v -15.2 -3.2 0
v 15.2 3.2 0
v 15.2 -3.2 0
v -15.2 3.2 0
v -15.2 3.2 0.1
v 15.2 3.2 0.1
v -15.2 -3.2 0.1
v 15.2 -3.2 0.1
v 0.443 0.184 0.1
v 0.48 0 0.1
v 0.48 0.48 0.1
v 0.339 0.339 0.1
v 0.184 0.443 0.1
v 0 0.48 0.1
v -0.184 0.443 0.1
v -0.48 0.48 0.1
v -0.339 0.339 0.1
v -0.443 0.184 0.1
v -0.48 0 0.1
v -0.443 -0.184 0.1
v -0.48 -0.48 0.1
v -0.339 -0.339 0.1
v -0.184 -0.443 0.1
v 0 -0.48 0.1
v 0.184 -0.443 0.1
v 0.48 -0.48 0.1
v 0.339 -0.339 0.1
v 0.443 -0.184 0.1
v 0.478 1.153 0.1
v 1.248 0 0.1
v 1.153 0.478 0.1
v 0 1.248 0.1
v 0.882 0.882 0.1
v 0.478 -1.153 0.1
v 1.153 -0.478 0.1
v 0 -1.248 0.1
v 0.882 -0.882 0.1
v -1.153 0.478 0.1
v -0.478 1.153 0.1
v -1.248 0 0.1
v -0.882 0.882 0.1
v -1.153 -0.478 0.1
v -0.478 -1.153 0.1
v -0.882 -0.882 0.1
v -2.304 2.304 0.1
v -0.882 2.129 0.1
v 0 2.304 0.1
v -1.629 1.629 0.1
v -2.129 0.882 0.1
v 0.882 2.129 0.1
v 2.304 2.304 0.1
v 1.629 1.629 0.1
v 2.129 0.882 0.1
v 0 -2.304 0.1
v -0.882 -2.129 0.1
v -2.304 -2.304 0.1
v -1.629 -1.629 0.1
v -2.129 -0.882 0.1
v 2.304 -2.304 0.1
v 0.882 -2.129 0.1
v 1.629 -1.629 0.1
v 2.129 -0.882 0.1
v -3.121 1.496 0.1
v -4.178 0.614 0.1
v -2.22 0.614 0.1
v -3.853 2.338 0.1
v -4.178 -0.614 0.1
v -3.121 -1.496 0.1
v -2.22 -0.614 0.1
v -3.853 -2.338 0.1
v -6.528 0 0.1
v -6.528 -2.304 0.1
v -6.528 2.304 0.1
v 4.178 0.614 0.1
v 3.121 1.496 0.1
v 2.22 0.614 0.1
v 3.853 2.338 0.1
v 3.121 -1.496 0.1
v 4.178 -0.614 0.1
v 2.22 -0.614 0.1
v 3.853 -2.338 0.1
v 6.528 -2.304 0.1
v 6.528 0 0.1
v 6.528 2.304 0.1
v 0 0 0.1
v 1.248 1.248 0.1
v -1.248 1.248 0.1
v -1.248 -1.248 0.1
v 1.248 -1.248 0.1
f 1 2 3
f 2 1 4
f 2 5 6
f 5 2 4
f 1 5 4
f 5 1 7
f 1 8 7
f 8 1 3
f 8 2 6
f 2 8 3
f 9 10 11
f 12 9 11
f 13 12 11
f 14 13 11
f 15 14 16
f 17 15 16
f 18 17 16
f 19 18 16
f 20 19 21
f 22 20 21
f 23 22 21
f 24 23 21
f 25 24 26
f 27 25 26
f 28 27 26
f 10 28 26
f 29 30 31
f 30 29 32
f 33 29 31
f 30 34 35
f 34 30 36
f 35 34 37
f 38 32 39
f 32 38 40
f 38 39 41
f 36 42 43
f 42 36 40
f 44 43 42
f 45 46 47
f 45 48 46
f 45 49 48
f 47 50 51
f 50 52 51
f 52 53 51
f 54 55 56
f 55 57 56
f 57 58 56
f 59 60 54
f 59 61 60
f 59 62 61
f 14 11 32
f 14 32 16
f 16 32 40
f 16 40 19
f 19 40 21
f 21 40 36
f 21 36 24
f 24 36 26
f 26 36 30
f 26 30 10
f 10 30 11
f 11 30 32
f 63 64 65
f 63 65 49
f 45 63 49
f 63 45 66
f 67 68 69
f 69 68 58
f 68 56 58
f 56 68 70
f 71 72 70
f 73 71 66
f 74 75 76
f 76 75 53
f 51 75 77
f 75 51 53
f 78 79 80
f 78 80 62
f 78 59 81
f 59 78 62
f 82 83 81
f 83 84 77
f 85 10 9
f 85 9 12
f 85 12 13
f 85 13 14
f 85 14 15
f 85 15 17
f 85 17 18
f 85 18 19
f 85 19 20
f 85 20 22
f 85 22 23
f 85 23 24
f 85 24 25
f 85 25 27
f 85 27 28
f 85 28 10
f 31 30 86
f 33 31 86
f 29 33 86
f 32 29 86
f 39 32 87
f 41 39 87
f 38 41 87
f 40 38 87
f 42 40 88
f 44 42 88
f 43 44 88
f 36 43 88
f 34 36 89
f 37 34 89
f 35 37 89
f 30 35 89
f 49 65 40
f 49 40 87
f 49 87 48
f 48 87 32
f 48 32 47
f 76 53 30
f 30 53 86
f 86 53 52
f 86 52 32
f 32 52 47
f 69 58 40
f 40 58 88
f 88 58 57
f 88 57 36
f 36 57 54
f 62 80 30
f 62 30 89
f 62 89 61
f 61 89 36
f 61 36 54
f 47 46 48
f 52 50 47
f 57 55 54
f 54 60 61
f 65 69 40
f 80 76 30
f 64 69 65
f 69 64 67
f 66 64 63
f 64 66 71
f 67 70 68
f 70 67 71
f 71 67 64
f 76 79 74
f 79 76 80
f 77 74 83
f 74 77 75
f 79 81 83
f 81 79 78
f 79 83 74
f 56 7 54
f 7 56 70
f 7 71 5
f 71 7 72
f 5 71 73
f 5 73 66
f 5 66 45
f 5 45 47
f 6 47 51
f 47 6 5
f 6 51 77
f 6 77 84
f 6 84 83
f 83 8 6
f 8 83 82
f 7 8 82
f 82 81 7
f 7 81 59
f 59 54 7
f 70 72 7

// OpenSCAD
// file: ../p/4-4disc.scad
use <../lib.scad>
function ldraw_lib__4_4disc() = [
// 0 Disc 1.0
// 0 Name: 4-4disc.dat
// 0 Author: James Jessiman
// 0 !LDRAW_ORG Primitive UPDATE 2002-02
// 0 !LICENSE Licensed under CC BY 4.0 : see CAreadme.txt
// 
// 0 BFC CERTIFY CCW
  [0,"BFC","CERTIFY"],
  [0,"BFC","CCW"],
// 
// 0 !HISTORY 1998-12-15 [PTadmin] Official Update 1998-10
// 0 !HISTORY 2002-03-23 [sbliss] Added BFC statement
// 0 !HISTORY 2002-04-25 [PTadmin] Official Update 2002-02
// 0 !HISTORY 2007-06-24 [PTadmin] Header formatted for Contributor Agreement
// 0 !HISTORY 2008-07-01 [PTadmin] Official Update 2008-01
// 
// 
// 3 16 0 0 0 1 0 0 0.9239 0 0.3827
  [3,16,0,0,0,1,0,0,0.9239,0,0.3827],
// 3 16 0 0 0 0.9239 0 0.3827 0.7071 0 0.7071
  [3,16,0,0,0,0.9239,0,0.3827,0.7071,0,0.7071],
// 3 16 0 0 0 0.7071 0 0.7071 0.3827 0 0.9239
  [3,16,0,0,0,0.7071,0,0.7071,0.3827,0,0.9239],
// 3 16 0 0 0 0.3827 0 0.9239 0 0 1
  [3,16,0,0,0,0.3827,0,0.9239,0,0,1],
// 3 16 0 0 0 0 0 1 -0.3827 0 0.9239
  [3,16,0,0,0,0,0,1,-0.3827,0,0.9239],
// 3 16 0 0 0 -0.3827 0 0.9239 -0.7071 0 0.7071
  [3,16,0,0,0,-0.3827,0,0.9239,-0.7071,0,0.7071],
// 3 16 0 0 0 -0.7071 0 0.7071 -0.9239 0 0.3827
  [3,16,0,0,0,-0.7071,0,0.7071,-0.9239,0,0.3827],
// 3 16 0 0 0 -0.9239 0 0.3827 -1 0 -0
  [3,16,0,0,0,-0.9239,0,0.3827,-1,0,-0],
// 3 16 0 0 0 -1 0 -0 -0.9239 0 -0.3827
  [3,16,0,0,0,-1,0,-0,-0.9239,0,-0.3827],
// 3 16 0 0 0 -0.9239 0 -0.3827 -0.7071 0 -0.7071
  [3,16,0,0,0,-0.9239,0,-0.3827,-0.7071,0,-0.7071],
// 3 16 0 0 0 -0.7071 0 -0.7071 -0.3827 0 -0.9239
  [3,16,0,0,0,-0.7071,0,-0.7071,-0.3827,0,-0.9239],
// 3 16 0 0 0 -0.3827 0 -0.9239 0 0 -1
  [3,16,0,0,0,-0.3827,0,-0.9239,0,0,-1],
// 3 16 0 0 0 0 0 -1 0.3827 0 -0.9239
  [3,16,0,0,0,0,0,-1,0.3827,0,-0.9239],
// 3 16 0 0 0 0.3827 0 -0.9239 0.7071 0 -0.7071
  [3,16,0,0,0,0.3827,0,-0.9239,0.7071,0,-0.7071],
// 3 16 0 0 0 0.7071 0 -0.7071 0.9239 0 -0.3827
  [3,16,0,0,0,0.7071,0,-0.7071,0.9239,0,-0.3827],
// 3 16 0 0 0 0.9239 0 -0.3827 1 0 0
  [3,16,0,0,0,0.9239,0,-0.3827,1,0,0],
// 0
];
module ldraw_lib__4_4disc(step=0, col=false, unit=2/5, alt=false, line=0.2, solid=!$preview)
    makepoly(ldraw_lib__4_4disc(), step=step, col=col, unit=unit, alt=alt, line=line, solid=solid);
ldraw_lib__4_4disc(line=0.2);
// file: ../p/1-8chrd.scad
use <../lib.scad>
function ldraw_lib__1_8chrd() = [
// 0 Chord 0.125
// 0 Name: 1-8chrd.dat
// 0 Author: Orion Pobursky [OrionP]
// 0 !LDRAW_ORG Primitive UPDATE 2023-05
// 0 !LICENSE Licensed under CC BY 4.0 : see CAreadme.txt
// 
// 0 BFC CERTIFY CCW
  [0,"BFC","CERTIFY"],
  [0,"BFC","CCW"],
// 
// 0 !HISTORY 2004-04-22 [PTadmin] Official Update 2004-02
// 0 !HISTORY 2007-06-22 [PTadmin] Header formatted for Contributor Agreement
// 0 !HISTORY 2008-07-01 [PTadmin] Official Update 2008-01
// 0 !HISTORY 2023-10-27 [OrionP] Rebuilt with PrimGen2, original author westrate
// 0 !HISTORY 2023-10-31 [OrionP] Official Update 2023-05
// 
// 3 16 1 0 0 0.9239 0 0.3827 0.7071 0 0.7071
  [3,16,1,0,0,0.9239,0,0.3827,0.7071,0,0.7071],
];
module ldraw_lib__1_8chrd(step=0, col=false, unit=2/5, alt=false, line=0.2, solid=!$preview)
    makepoly(ldraw_lib__1_8chrd(), step=step, col=col, unit=unit, alt=alt, line=line, solid=solid);
ldraw_lib__1_8chrd(line=0.2);
// file: ../p/4-4ndis.scad
use <../lib.scad>
function ldraw_lib__4_4ndis() = [
// 0 Disc Negative 1.0
// 0 Name: 4-4ndis.dat
// 0 Author: James Jessiman
// 0 !LDRAW_ORG Primitive UPDATE 2012-01
// 0 !LICENSE Licensed under CC BY 4.0 : see CAreadme.txt
// 
// 0 BFC CERTIFY CCW
  [0,"BFC","CERTIFY"],
  [0,"BFC","CCW"],
// 
// 0 !HISTORY 2002-03-23 [sbliss] Added BFC statement; compacted code
// 0 !HISTORY 2002-04-25 [PTadmin] Official Update 2002-02
// 0 !HISTORY 2007-06-24 [PTadmin] Header formatted for Contributor Agreement
// 0 !HISTORY 2008-07-01 [PTadmin] Official Update 2008-01
// 0 !HISTORY 2012-02-16 [Philo] Changed to CCW
// 0 !HISTORY 2012-03-30 [PTadmin] Official Update 2012-01
// 
// 
// 3 16 0.9239 0 0.3827 1 0 0 1 0 1
  [3,16,0.9239,0,0.3827,1,0,0,1,0,1],
// 3 16 0.7071 0 0.7071 0.9239 0 0.3827 1 0 1
  [3,16,0.7071,0,0.7071,0.9239,0,0.3827,1,0,1],
// 3 16 0.3827 0 0.9239 0.7071 0 0.7071 1 0 1
  [3,16,0.3827,0,0.9239,0.7071,0,0.7071,1,0,1],
// 3 16 0 0 1 0.3827 0 0.9239 1 0 1
  [3,16,0,0,1,0.3827,0,0.9239,1,0,1],
// 3 16 -0.3827 0 0.9239 0 0 1 -1 0 1
  [3,16,-0.3827,0,0.9239,0,0,1,-1,0,1],
// 3 16 -0.7071 0 0.7071 -0.3827 0 0.9239 -1 0 1
  [3,16,-0.7071,0,0.7071,-0.3827,0,0.9239,-1,0,1],
// 3 16 -0.9239 0 0.3827 -0.7071 0 0.7071 -1 0 1
  [3,16,-0.9239,0,0.3827,-0.7071,0,0.7071,-1,0,1],
// 3 16 -1 0 0 -0.9239 0 0.3827 -1 0 1
  [3,16,-1,0,0,-0.9239,0,0.3827,-1,0,1],
// 3 16 -0.9239 0 -0.3827 -1 0 0 -1 0 -1
  [3,16,-0.9239,0,-0.3827,-1,0,0,-1,0,-1],
// 3 16 -0.7071 0 -0.7071 -0.9239 0 -0.3827 -1 0 -1
  [3,16,-0.7071,0,-0.7071,-0.9239,0,-0.3827,-1,0,-1],
// 3 16 -0.3827 0 -0.9239 -0.7071 0 -0.7071 -1 0 -1
  [3,16,-0.3827,0,-0.9239,-0.7071,0,-0.7071,-1,0,-1],
// 3 16 0 0 -1 -0.3827 0 -0.9239 -1 0 -1
  [3,16,0,0,-1,-0.3827,0,-0.9239,-1,0,-1],
// 3 16 0.3827 0 -0.9239 0 0 -1 1 0 -1
  [3,16,0.3827,0,-0.9239,0,0,-1,1,0,-1],
// 3 16 0.7071 0 -0.7071 0.3827 0 -0.9239 1 0 -1
  [3,16,0.7071,0,-0.7071,0.3827,0,-0.9239,1,0,-1],
// 3 16 0.9239 0 -0.3827 0.7071 0 -0.7071 1 0 -1
  [3,16,0.9239,0,-0.3827,0.7071,0,-0.7071,1,0,-1],
// 3 16 1 0 0 0.9239 0 -0.3827 1 0 -1
  [3,16,1,0,0,0.9239,0,-0.3827,1,0,-1],
];
module ldraw_lib__4_4ndis(step=0, col=false, unit=2/5, alt=false, line=0.2, solid=!$preview)
    makepoly(ldraw_lib__4_4ndis(), step=step, col=col, unit=unit, alt=alt, line=line, solid=solid);
ldraw_lib__4_4ndis(line=0.2);
// file: ../p/3-16ndis.scad
use <../lib.scad>
function ldraw_lib__3_16ndis() = [
// 0 Disc Negative 0.1875
// 0 Name: 3-16ndis.dat
// 0 Author: Guy Vivan [guyvivan]
// 0 !LDRAW_ORG Primitive UPDATE 2009-01
// 0 !LICENSE Licensed under CC BY 2.0 and CC BY 4.0 : see CAreadme.txt
// 
// 0 BFC CERTIFY CCW
  [0,"BFC","CERTIFY"],
  [0,"BFC","CCW"],
// 
// 0 !HISTORY 2009-05-02 [PTadmin] Official Update 2009-01
// 
// 
// 3 16 1 0 1 0.9239 0 0.3827 1 0 0
  [3,16,1,0,1,0.9239,0,0.3827,1,0,0],
// 3 16 1 0 1 0.7071 0 0.7071 0.9239 0 0.3827
  [3,16,1,0,1,0.7071,0,0.7071,0.9239,0,0.3827],
// 3 16 1 0 1 0.3827 0 0.9239 0.7071 0 0.7071
  [3,16,1,0,1,0.3827,0,0.9239,0.7071,0,0.7071],
// 
// 0 end of file
// 
];
module ldraw_lib__3_16ndis(step=0, col=false, unit=2/5, alt=false, line=0.2, solid=!$preview)
    makepoly(ldraw_lib__3_16ndis(), step=step, col=col, unit=unit, alt=alt, line=line, solid=solid);
ldraw_lib__3_16ndis(line=0.2);
// file: ../p/1-4chrd.scad
use <../lib.scad>
function ldraw_lib__1_4chrd() = [
// 0 Chord 0.25
// 0 Name: 1-4chrd.dat
// 0 Author: Max Martin Richter [MMR1988]
// 0 !LDRAW_ORG Primitive UPDATE 2023-05
// 0 !LICENSE Licensed under CC BY 4.0 : see CAreadme.txt
// 
// 0 BFC CERTIFY CCW
  [0,"BFC","CERTIFY"],
  [0,"BFC","CCW"],
// 
// 0 !HISTORY 2004-04-22 [PTadmin] Official Update 2004-02
// 0 !HISTORY 2007-10-09 [PTadmin] Header formatted for Contributor Agreement
// 0 !HISTORY 2008-07-01 [PTadmin] Official Update 2008-01
// 0 !HISTORY 2012-08-02 [MMR1988] Re-creation with PrimGen2 and Rectifier
// 0 !HISTORY 2012-08-09 [PTadmin] Official Update 2012-02
// 0 !HISTORY 2023-10-27 [OrionP] Change author to MMR1988 from hafhead
// 0 !HISTORY 2023-10-31 [OrionP] Official Update 2023-05
// 
// 4 16 0.9239 0 0.3827 0.3827 0 0.9239 0 0 1 1 0 0
  [4,16,0.9239,0,0.3827,0.3827,0,0.9239,0,0,1,1,0,0],
// 3 16 0.7071 0 0.7071 0.3827 0 0.9239 0.9239 0 0.3827
  [3,16,0.7071,0,0.7071,0.3827,0,0.9239,0.9239,0,0.3827],
];
module ldraw_lib__1_4chrd(step=0, col=false, unit=2/5, alt=false, line=0.2, solid=!$preview)
    makepoly(ldraw_lib__1_4chrd(), step=step, col=col, unit=unit, alt=alt, line=line, solid=solid);
ldraw_lib__1_4chrd(line=0.2);
// file: ../p/logo-train-2006-bold.scad
use <../lib.scad>
use <1-8chrd.scad>
use <4-4disc.scad>
use <4-4ndis.scad>
function ldraw_lib__logo_train_2006_bold() = [
// 0 Logo Train 2006 Bold
// 0 Name: logo-train-2006-bold.dat
// 0 Author: Gerald Lasser [GeraldLasser]
// 0 !LDRAW_ORG Primitive UPDATE 2023-07
// 0 !LICENSE Licensed under CC BY 4.0 : see CAreadme.txt
// 
// 0 BFC CERTIFY CCW
  [0,"BFC","CERTIFY"],
  [0,"BFC","CCW"],
// 
// 0 !HISTORY 2023-12-31 [OrionP] Official Update 2023-07
// 
// 
// 1 16 0 -.25 0 2.5 0 0 0 1 0 0 0 2.5 4-4disc.dat
  [1,16,0,-.25,0,2.5,0,0,0,1,0,0,0,2.5, ldraw_lib__4_4disc()],
// 1 16 0 -.25 0 6.5 0 0 0 1 0 0 0 6.5 4-4ndis.dat
  [1,16,0,-.25,0,6.5,0,0,0,1,0,0,0,6.5, ldraw_lib__4_4ndis()],
// 
// 3 16 -11.0868 -.25 4.5924 -11.5625 -.25 3.2 -6.5 -.25 0
  [3,16,-11.0868,-.25,4.5924,-11.5625,-.25,3.2,-6.5,-.25,0],
// 3 16 -11.0868 -.25 4.5924 -6.5 -.25 0 -6.5 -.25 6.5
  [3,16,-11.0868,-.25,4.5924,-6.5,-.25,0,-6.5,-.25,6.5],
// 3 16 -11.0868 -.25 4.5924 -6.5 -.25 6.5 -8.4852 -.25 8.4852
  [3,16,-11.0868,-.25,4.5924,-6.5,-.25,6.5,-8.4852,-.25,8.4852],
// 3 16 -8.4852 -.25 8.4852 -6.5 -.25 6.5 0 -.25 6.5
  [3,16,-8.4852,-.25,8.4852,-6.5,-.25,6.5,0,-.25,6.5],
// 3 16 -8.4852 -.25 8.4852 0 -.25 6.5 0 -.25 12
  [3,16,-8.4852,-.25,8.4852,0,-.25,6.5,0,-.25,12],
// 3 16 11.5625 -.25 3.2 11.0868 -.25 4.5924 6.5 -.25 0
  [3,16,11.5625,-.25,3.2,11.0868,-.25,4.5924,6.5,-.25,0],
// 3 16 6.5 -.25 0 11.0868 -.25 4.5924 6.5 -.25 6.5
  [3,16,6.5,-.25,0,11.0868,-.25,4.5924,6.5,-.25,6.5],
// 3 16 6.5 -.25 6.5 11.0868 -.25 4.5924 8.4852 -.25 8.4852
  [3,16,6.5,-.25,6.5,11.0868,-.25,4.5924,8.4852,-.25,8.4852],
// 3 16 6.5 -.25 6.5 8.4852 -.25 8.4852 0 -.25 6.5
  [3,16,6.5,-.25,6.5,8.4852,-.25,8.4852,0,-.25,6.5],
// 3 16 0 -.25 6.5 8.4852 -.25 8.4852 0 -.25 12
  [3,16,0,-.25,6.5,8.4852,-.25,8.4852,0,-.25,12],
// 3 16 -11.5625 -.25 -3.2 -11.0868 -.25 -4.5924 -6.5 -.25 0
  [3,16,-11.5625,-.25,-3.2,-11.0868,-.25,-4.5924,-6.5,-.25,0],
// 3 16 -6.5 -.25 0 -11.0868 -.25 -4.5924 -6.5 -.25 -6.5
  [3,16,-6.5,-.25,0,-11.0868,-.25,-4.5924,-6.5,-.25,-6.5],
// 3 16 -6.5 -.25 -6.5 -11.0868 -.25 -4.5924 -8.4852 -.25 -8.4852
  [3,16,-6.5,-.25,-6.5,-11.0868,-.25,-4.5924,-8.4852,-.25,-8.4852],
// 3 16 -6.5 -.25 -6.5 -8.4852 -.25 -8.4852 0 -.25 -6.5
  [3,16,-6.5,-.25,-6.5,-8.4852,-.25,-8.4852,0,-.25,-6.5],
// 3 16 0 -.25 -6.5 -8.4852 -.25 -8.4852 0 -.25 -12
  [3,16,0,-.25,-6.5,-8.4852,-.25,-8.4852,0,-.25,-12],
// 3 16 11.0868 -.25 -4.5924 11.5625 -.25 -3.2 6.5 -.25 0
  [3,16,11.0868,-.25,-4.5924,11.5625,-.25,-3.2,6.5,-.25,0],
// 3 16 11.0868 -.25 -4.5924 6.5 -.25 0 6.5 -.25 -6.5
  [3,16,11.0868,-.25,-4.5924,6.5,-.25,0,6.5,-.25,-6.5],
// 3 16 11.0868 -.25 -4.5924 6.5 -.25 -6.5 8.4852 -.25 -8.4852
  [3,16,11.0868,-.25,-4.5924,6.5,-.25,-6.5,8.4852,-.25,-8.4852],
// 3 16 8.4852 -.25 -8.4852 6.5 -.25 -6.5 0 -.25 -6.5
  [3,16,8.4852,-.25,-8.4852,6.5,-.25,-6.5,0,-.25,-6.5],
// 3 16 8.4852 -.25 -8.4852 0 -.25 -6.5 0 -.25 -12
  [3,16,8.4852,-.25,-8.4852,0,-.25,-6.5,0,-.25,-12],
// 1 16 0 -.25 0 0 0 -12 0 1 0 12 0 0 1-8chrd.dat
  [1,16,0,-.25,0,0,0,-12,0,1,0,12,0,0, ldraw_lib__1_8chrd()],
// 1 16 0 -.25 0 0 0 12 0 1 0 12 0 0 1-8chrd.dat
  [1,16,0,-.25,0,0,0,12,0,1,0,12,0,0, ldraw_lib__1_8chrd()],
// 1 16 0 -.25 0 0 0 -12 0 1 0 -12 0 0 1-8chrd.dat
  [1,16,0,-.25,0,0,0,-12,0,1,0,-12,0,0, ldraw_lib__1_8chrd()],
// 1 16 0 -.25 0 0 0 12 0 1 0 -12 0 0 1-8chrd.dat
  [1,16,0,-.25,0,0,0,12,0,1,0,-12,0,0, ldraw_lib__1_8chrd()],
// 3 16 -11.5625 -.25 3.2 -11.5625 -.25 -3.2 -6.5 -.25 0
  [3,16,-11.5625,-.25,3.2,-11.5625,-.25,-3.2,-6.5,-.25,0],
// 3 16 11.5625 -.25 -3.2 11.5625 -.25 3.2 6.5 -.25 0
  [3,16,11.5625,-.25,-3.2,11.5625,-.25,3.2,6.5,-.25,0],
// 4 16 -21.7625 -.25 3.2 -21.7625 -.25 -3.2 -11.5625 -.25 -3.2 -11.5625 -.25 3.2
  [4,16,-21.7625,-.25,3.2,-21.7625,-.25,-3.2,-11.5625,-.25,-3.2,-11.5625,-.25,3.2],
// 4 16 -34 -.25 0 -21.7625 -.25 3.2 -16.255 -.25 7.7915 -20.0662 -.25 12.1778
  [4,16,-34,-.25,0,-21.7625,-.25,3.2,-16.255,-.25,7.7915,-20.0662,-.25,12.1778],
// 4 16 -16.255 -.25 -7.7915 -21.7625 -.25 -3.2 -34 -.25 0 -20.0662 -.25 -12.1778
  [4,16,-16.255,-.25,-7.7915,-21.7625,-.25,-3.2,-34,-.25,0,-20.0662,-.25,-12.1778],
// 3 16 -34 -.25 0 -21.7625 -.25 -3.2 -21.7625 -.25 3.2
  [3,16,-34,-.25,0,-21.7625,-.25,-3.2,-21.7625,-.25,3.2],
// 4 16 11.5625 -.25 -3.2 21.7625 -.25 -3.2 21.7625 -.25 3.2 11.5625 -.25 3.2
  [4,16,11.5625,-.25,-3.2,21.7625,-.25,-3.2,21.7625,-.25,3.2,11.5625,-.25,3.2],
// 4 16 16.255 -.25 7.7915 21.7625 -.25 3.2 34 -.25 0 20.0662 -.25 12.1778
  [4,16,16.255,-.25,7.7915,21.7625,-.25,3.2,34,-.25,0,20.0662,-.25,12.1778],
// 4 16 34 -.25 0 21.7625 -.25 -3.2 16.255 -.25 -7.7915 20.0662 -.25 -12.1778
  [4,16,34,-.25,0,21.7625,-.25,-3.2,16.255,-.25,-7.7915,20.0662,-.25,-12.1778],
// 3 16 21.7625 -.25 -3.2 34 -.25 0 21.7625 -.25 3.2
  [3,16,21.7625,-.25,-3.2,34,-.25,0,21.7625,-.25,3.2],
];
module ldraw_lib__logo_train_2006_bold(step=0, col=false, unit=2/5, alt=false, line=0.2, solid=!$preview)
    makepoly(ldraw_lib__logo_train_2006_bold(), step=step, col=col, unit=unit, alt=alt, line=line, solid=solid);
ldraw_lib__logo_train_2006_bold(line=0.2);
// file: ../p/logo-train-2006-bold-box.scad
use <../lib.scad>
use <1-4chrd.scad>
use <3-16ndis.scad>
use <4-4ndis.scad>
function ldraw_lib__logo_train_2006_bold_box() = [
// 0 Logo Train 2006 Bold Outer Box
// 0 Name: logo-train-2006-bold-box.dat
// 0 Author: Gerald Lasser [GeraldLasser]
// 0 !LDRAW_ORG Primitive UPDATE 2023-07
// 0 !LICENSE Licensed under CC BY 4.0 : see CAreadme.txt
// 
// 0 BFC CERTIFY CCW
  [0,"BFC","CERTIFY"],
  [0,"BFC","CCW"],
// 
// 0 !HISTORY 2023-12-31 [OrionP] Official Update 2023-07
// 
// 
// 1 16 0 -.25 0 2.5 0 0 0 1 0 0 0 2.5 4-4ndis.dat
  [1,16,0,-.25,0,2.5,0,0,0,1,0,0,0,2.5, ldraw_lib__4_4ndis()],
// 1 16 0 -.25 0 6.5 0 0 0 1 0 0 0 6.5 1-4chrd.dat
  [1,16,0,-.25,0,6.5,0,0,0,1,0,0,0,6.5, ldraw_lib__1_4chrd()],
// 1 16 0 -.25 0 6.5 0 0 0 1 0 0 0 -6.5 1-4chrd.dat
  [1,16,0,-.25,0,6.5,0,0,0,1,0,0,0,-6.5, ldraw_lib__1_4chrd()],
// 1 16 0 -.25 0 -6.5 0 0 0 1 0 0 0 6.5 1-4chrd.dat
  [1,16,0,-.25,0,-6.5,0,0,0,1,0,0,0,6.5, ldraw_lib__1_4chrd()],
// 1 16 0 -.25 0 -6.5 0 0 0 1 0 0 0 -6.5 1-4chrd.dat
  [1,16,0,-.25,0,-6.5,0,0,0,1,0,0,0,-6.5, ldraw_lib__1_4chrd()],
// 1 16 0 -.25 0 0 0 -12 0 1 0 12 0 0 3-16ndis.dat
  [1,16,0,-.25,0,0,0,-12,0,1,0,12,0,0, ldraw_lib__3_16ndis()],
// 1 16 0 -.25 0 0 0 12 0 1 0 12 0 0 3-16ndis.dat
  [1,16,0,-.25,0,0,0,12,0,1,0,12,0,0, ldraw_lib__3_16ndis()],
// 1 16 0 -.25 0 0 0 -12 0 1 0 -12 0 0 3-16ndis.dat
  [1,16,0,-.25,0,0,0,-12,0,1,0,-12,0,0, ldraw_lib__3_16ndis()],
// 1 16 0 -.25 0 0 0 12 0 1 0 -12 0 0 3-16ndis.dat
  [1,16,0,-.25,0,0,0,12,0,1,0,-12,0,0, ldraw_lib__3_16ndis()],
// 3 16 0 -.25 2.5 2.5 -.25 2.5 0 -.25 6.5
  [3,16,0,-.25,2.5,2.5,-.25,2.5,0,-.25,6.5],
// 3 16 0 -.25 2.5 0 -.25 6.5 -2.5 -.25 2.5
  [3,16,0,-.25,2.5,0,-.25,6.5,-2.5,-.25,2.5],
// 3 16 -2.5 -.25 2.5 0 -.25 6.5 -6.5 -.25 0
  [3,16,-2.5,-.25,2.5,0,-.25,6.5,-6.5,-.25,0],
// 3 16 -2.5 -.25 2.5 -6.5 -.25 0 -2.5 -.25 0
  [3,16,-2.5,-.25,2.5,-6.5,-.25,0,-2.5,-.25,0],
// 3 16 -2.5 -.25 0 -6.5 -.25 0 -2.5 -.25 -2.5
  [3,16,-2.5,-.25,0,-6.5,-.25,0,-2.5,-.25,-2.5],
// 3 16 -2.5 -.25 -2.5 -6.5 -.25 0 0 -.25 -6.5
  [3,16,-2.5,-.25,-2.5,-6.5,-.25,0,0,-.25,-6.5],
// 3 16 -2.5 -.25 -2.5 0 -.25 -6.5 0 -.25 -2.5
  [3,16,-2.5,-.25,-2.5,0,-.25,-6.5,0,-.25,-2.5],
// 3 16 0 -.25 -2.5 0 -.25 -6.5 2.5 -.25 -2.5
  [3,16,0,-.25,-2.5,0,-.25,-6.5,2.5,-.25,-2.5],
// 3 16 2.5 -.25 -2.5 0 -.25 -6.5 6.5 -.25 0
  [3,16,2.5,-.25,-2.5,0,-.25,-6.5,6.5,-.25,0],
// 3 16 2.5 -.25 -2.5 6.5 -.25 0 2.5 -.25 0
  [3,16,2.5,-.25,-2.5,6.5,-.25,0,2.5,-.25,0],
// 3 16 2.5 -.25 0 6.5 -.25 0 2.5 -.25 2.5
  [3,16,2.5,-.25,0,6.5,-.25,0,2.5,-.25,2.5],
// 3 16 2.5 -.25 2.5 6.5 -.25 0 0 -.25 6.5
  [3,16,2.5,-.25,2.5,6.5,-.25,0,0,-.25,6.5],
// 
// 3 16 -16.255 -.25 7.7915 -21.7625 -.25 3.2 -11.5625 -.25 3.2
  [3,16,-16.255,-.25,7.7915,-21.7625,-.25,3.2,-11.5625,-.25,3.2],
// 3 16 -16.255 -.25 7.7915 -11.5625 -.25 3.2 -11.0868 -.25 4.5924
  [3,16,-16.255,-.25,7.7915,-11.5625,-.25,3.2,-11.0868,-.25,4.5924],
// 4 16 -12 -.25 12 -20.0662 -.25 12.1778 -16.255 -.25 7.7915 -11.0868 -.25 4.5924
  [4,16,-12,-.25,12,-20.0662,-.25,12.1778,-16.255,-.25,7.7915,-11.0868,-.25,4.5924],
// 3 16 -21.7625 -.25 -3.2 -16.255 -.25 -7.7915 -11.5625 -.25 -3.2
  [3,16,-21.7625,-.25,-3.2,-16.255,-.25,-7.7915,-11.5625,-.25,-3.2],
// 3 16 -11.5625 -.25 -3.2 -16.255 -.25 -7.7915 -11.0868 -.25 -4.5924
  [3,16,-11.5625,-.25,-3.2,-16.255,-.25,-7.7915,-11.0868,-.25,-4.5924],
// 4 16 -16.255 -.25 -7.7915 -20.0662 -.25 -12.1778 -12 -.25 -12 -11.0868 -.25 -4.5924
  [4,16,-16.255,-.25,-7.7915,-20.0662,-.25,-12.1778,-12,-.25,-12,-11.0868,-.25,-4.5924],
// 3 16 -34 -.25 0 -34 -.25 -12 -20.0662 -.25 -12.1778
  [3,16,-34,-.25,0,-34,-.25,-12,-20.0662,-.25,-12.1778],
// 3 16 -34 -.25 12 -34 -.25 0 -20.0662 -.25 12.1778
  [3,16,-34,-.25,12,-34,-.25,0,-20.0662,-.25,12.1778],
// 3 16 21.7625 -.25 3.2 16.255 -.25 7.7915 11.5625 -.25 3.2
  [3,16,21.7625,-.25,3.2,16.255,-.25,7.7915,11.5625,-.25,3.2],
// 3 16 11.5625 -.25 3.2 16.255 -.25 7.7915 11.0868 -.25 4.5924
  [3,16,11.5625,-.25,3.2,16.255,-.25,7.7915,11.0868,-.25,4.5924],
// 4 16 16.255 -.25 7.7915 20.0662 -.25 12.1778 12 -.25 12 11.0868 -.25 4.5924
  [4,16,16.255,-.25,7.7915,20.0662,-.25,12.1778,12,-.25,12,11.0868,-.25,4.5924],
// 3 16 16.255 -.25 -7.7915 21.7625 -.25 -3.2 11.5625 -.25 -3.2
  [3,16,16.255,-.25,-7.7915,21.7625,-.25,-3.2,11.5625,-.25,-3.2],
// 3 16 16.255 -.25 -7.7915 11.5625 -.25 -3.2 11.0868 -.25 -4.5924
  [3,16,16.255,-.25,-7.7915,11.5625,-.25,-3.2,11.0868,-.25,-4.5924],
// 4 16 12 -.25 -12 20.0662 -.25 -12.1778 16.255 -.25 -7.7915 11.0868 -.25 -4.5924
  [4,16,12,-.25,-12,20.0662,-.25,-12.1778,16.255,-.25,-7.7915,11.0868,-.25,-4.5924],
// 3 16 34 -.25 -12 34 -.25 0 20.0662 -.25 -12.1778
  [3,16,34,-.25,-12,34,-.25,0,20.0662,-.25,-12.1778],
// 3 16 34 -.25 0 34 -.25 12 20.0662 -.25 12.1778
  [3,16,34,-.25,0,34,-.25,12,20.0662,-.25,12.1778],
];
module ldraw_lib__logo_train_2006_bold_box(step=0, col=false, unit=2/5, alt=false, line=0.2, solid=!$preview)
    makepoly(ldraw_lib__logo_train_2006_bold_box(), step=step, col=col, unit=unit, alt=alt, line=line, solid=solid);
ldraw_lib__logo_train_2006_bold_box(line=0.2);
// file: ../p/box5-12.scad
use <../lib.scad>
function ldraw_lib__box5_12() = [
// 0 Box with 5 Faces without Any Edges
// 0 Name: box5-12.dat
// 0 Author: Chris Dee [cwdee]
// 0 !LDRAW_ORG Primitive UPDATE 2009-02
// 0 !LICENSE Licensed under CC BY 4.0 : see CAreadme.txt
// 
// 0 BFC CERTIFY CCW
  [0,"BFC","CERTIFY"],
  [0,"BFC","CCW"],
// 
// 0 !HISTORY 2009-09-03 [PTadmin] Official Update 2009-02
// 
// 
// 4 16 1 1 1 1 1 -1 -1 1 -1 -1 1 1
  [4,16,1,1,1,1,1,-1,-1,1,-1,-1,1,1],
// 4 16 -1 0 1 1 0 1 1 1 1 -1 1 1
  [4,16,-1,0,1,1,0,1,1,1,1,-1,1,1],
// 4 16 -1 0 -1 -1 0 1 -1 1 1 -1 1 -1
  [4,16,-1,0,-1,-1,0,1,-1,1,1,-1,1,-1],
// 4 16 1 0 -1 -1 0 -1 -1 1 -1 1 1 -1
  [4,16,1,0,-1,-1,0,-1,-1,1,-1,1,1,-1],
// 4 16 1 0 1 1 0 -1 1 1 -1 1 1 1
  [4,16,1,0,1,1,0,-1,1,1,-1,1,1,1],
// 0
];
module ldraw_lib__box5_12(step=0, col=false, unit=2/5, alt=false, line=0.2, solid=!$preview)
    makepoly(ldraw_lib__box5_12(), step=step, col=col, unit=unit, alt=alt, line=line, solid=solid);
ldraw_lib__box5_12(line=0.2);
// main file
use <../lib.scad>
use <../p/box5-12.scad>
use <../p/logo-train-2006-bold-box.scad>
use <../p/logo-train-2006-bold.scad>
function ldraw_lib__4638848l() = [
// 0 Sticker  0.8 x  3.8 with Black Train Logo (2006, Bold) on Yellow Background
// 0 Name: 4638848l.dat
// 0 Author: Gerald Lasser [GeraldLasser]
// 0 !LDRAW_ORG Part UPDATE 2023-07
// 0 !LICENSE Licensed under CC BY 4.0 : see CAreadme.txt
// 
// 0 BFC CERTIFY CCW
  [0,"BFC","CERTIFY"],
  [0,"BFC","CCW"],
// 
// 0 !KEYWORDS 3677
// 
// 0 !HISTORY 2023-12-31 [OrionP] Official Update 2023-07
// 
// 
// 1 16 0 -.25 0 38 0 0 0 .25 0 0 0 8 box5-12.dat
  [1,16,0,-.25,0,38,0,0,0,.25,0,0,0,8, ldraw_lib__box5_12()],
// 
// 1 14 0 0 0 0.48 0 0 0 1 0 0 0 0.48 logo-train-2006-bold-box.dat
  [1,14,0,0,0,0.48,0,0,0,1,0,0,0,0.48, ldraw_lib__logo_train_2006_bold_box()],
// 1 0 0 0 0 0.48 0 0 0 1 0 0 0 0.48 logo-train-2006-bold.dat
  [1,0,0,0,0,0.48,0,0,0,1,0,0,0,0.48, ldraw_lib__logo_train_2006_bold()],
// 
// 3 14 -5.76 -.25 -5.76 -38 -.25 -8 0 -.25 -5.76
  [3,14,-5.76,-.25,-5.76,-38,-.25,-8,0,-.25,-5.76],
// 3 14 -38 -.25 -8 -5.76 -.25 -5.76 -9.631776 -.25 -5.845344
  [3,14,-38,-.25,-8,-5.76,-.25,-5.76,-9.631776,-.25,-5.845344],
// 4 14 -38 -.25 -8 -16.32 -.25 -5.76 -16.32 -.25 0 -38 -.25 8
  [4,14,-38,-.25,-8,-16.32,-.25,-5.76,-16.32,-.25,0,-38,-.25,8],
// 3 14 -38 -.25 8 -16.32 -.25 0 -16.32 -.25 5.76
  [3,14,-38,-.25,8,-16.32,-.25,0,-16.32,-.25,5.76],
// 3 14 -38 -.25 8 -16.32 -.25 5.76 -9.631776 -.25 5.845344
  [3,14,-38,-.25,8,-16.32,-.25,5.76,-9.631776,-.25,5.845344],
// 3 14 -38 -.25 8 -9.631776 -.25 5.845344 -5.76 -.25 5.76
  [3,14,-38,-.25,8,-9.631776,-.25,5.845344,-5.76,-.25,5.76],
// 3 14 -38 -.25 8 -5.76 -.25 5.76 0 -.25 5.76
  [3,14,-38,-.25,8,-5.76,-.25,5.76,0,-.25,5.76],
// 4 14 5.76 -.25 5.76 38 -.25 8 -38 -.25 8 0 -.25 5.76
  [4,14,5.76,-.25,5.76,38,-.25,8,-38,-.25,8,0,-.25,5.76],
// 3 14 38 -.25 8 5.76 -.25 5.76 9.631776 -.25 5.845344
  [3,14,38,-.25,8,5.76,-.25,5.76,9.631776,-.25,5.845344],
// 3 14 38 -.25 8 9.631776 -.25 5.845344 16.32 -.25 5.76
  [3,14,38,-.25,8,9.631776,-.25,5.845344,16.32,-.25,5.76],
// 3 14 38 -.25 8 16.32 -.25 5.76 16.32 -.25 0
  [3,14,38,-.25,8,16.32,-.25,5.76,16.32,-.25,0],
// 4 14 16.32 -.25 0 16.32 -.25 -5.76 38 -.25 -8 38 -.25 8
  [4,14,16.32,-.25,0,16.32,-.25,-5.76,38,-.25,-8,38,-.25,8],
// 3 14 -38 -.25 -8 38 -.25 -8 16.32 -.25 -5.76
  [3,14,-38,-.25,-8,38,-.25,-8,16.32,-.25,-5.76],
// 3 14 16.32 -.25 -5.76 9.631776 -.25 -5.845344 -38 -.25 -8
  [3,14,16.32,-.25,-5.76,9.631776,-.25,-5.845344,-38,-.25,-8],
// 3 14 -38 -.25 -8 9.631776 -.25 -5.845344 5.76 -.25 -5.76
  [3,14,-38,-.25,-8,9.631776,-.25,-5.845344,5.76,-.25,-5.76],
// 3 14 5.76 -.25 -5.76 0 -.25 -5.76 -38 -.25 -8
  [3,14,5.76,-.25,-5.76,0,-.25,-5.76,-38,-.25,-8],
// 
// 3 14 -9.631776 -.25 -5.845344 -16.32 -.25 -5.76 -38 -.25 -8
  [3,14,-9.631776,-.25,-5.845344,-16.32,-.25,-5.76,-38,-.25,-8],
];
module ldraw_lib__4638848l(step=0, col=false, unit=2/5, alt=false, line=0.2, solid=!$preview)
    makepoly(ldraw_lib__4638848l(), step=step, col=col, unit=unit, alt=alt, line=line, solid=solid);
ldraw_lib__4638848l(line=0.2);
